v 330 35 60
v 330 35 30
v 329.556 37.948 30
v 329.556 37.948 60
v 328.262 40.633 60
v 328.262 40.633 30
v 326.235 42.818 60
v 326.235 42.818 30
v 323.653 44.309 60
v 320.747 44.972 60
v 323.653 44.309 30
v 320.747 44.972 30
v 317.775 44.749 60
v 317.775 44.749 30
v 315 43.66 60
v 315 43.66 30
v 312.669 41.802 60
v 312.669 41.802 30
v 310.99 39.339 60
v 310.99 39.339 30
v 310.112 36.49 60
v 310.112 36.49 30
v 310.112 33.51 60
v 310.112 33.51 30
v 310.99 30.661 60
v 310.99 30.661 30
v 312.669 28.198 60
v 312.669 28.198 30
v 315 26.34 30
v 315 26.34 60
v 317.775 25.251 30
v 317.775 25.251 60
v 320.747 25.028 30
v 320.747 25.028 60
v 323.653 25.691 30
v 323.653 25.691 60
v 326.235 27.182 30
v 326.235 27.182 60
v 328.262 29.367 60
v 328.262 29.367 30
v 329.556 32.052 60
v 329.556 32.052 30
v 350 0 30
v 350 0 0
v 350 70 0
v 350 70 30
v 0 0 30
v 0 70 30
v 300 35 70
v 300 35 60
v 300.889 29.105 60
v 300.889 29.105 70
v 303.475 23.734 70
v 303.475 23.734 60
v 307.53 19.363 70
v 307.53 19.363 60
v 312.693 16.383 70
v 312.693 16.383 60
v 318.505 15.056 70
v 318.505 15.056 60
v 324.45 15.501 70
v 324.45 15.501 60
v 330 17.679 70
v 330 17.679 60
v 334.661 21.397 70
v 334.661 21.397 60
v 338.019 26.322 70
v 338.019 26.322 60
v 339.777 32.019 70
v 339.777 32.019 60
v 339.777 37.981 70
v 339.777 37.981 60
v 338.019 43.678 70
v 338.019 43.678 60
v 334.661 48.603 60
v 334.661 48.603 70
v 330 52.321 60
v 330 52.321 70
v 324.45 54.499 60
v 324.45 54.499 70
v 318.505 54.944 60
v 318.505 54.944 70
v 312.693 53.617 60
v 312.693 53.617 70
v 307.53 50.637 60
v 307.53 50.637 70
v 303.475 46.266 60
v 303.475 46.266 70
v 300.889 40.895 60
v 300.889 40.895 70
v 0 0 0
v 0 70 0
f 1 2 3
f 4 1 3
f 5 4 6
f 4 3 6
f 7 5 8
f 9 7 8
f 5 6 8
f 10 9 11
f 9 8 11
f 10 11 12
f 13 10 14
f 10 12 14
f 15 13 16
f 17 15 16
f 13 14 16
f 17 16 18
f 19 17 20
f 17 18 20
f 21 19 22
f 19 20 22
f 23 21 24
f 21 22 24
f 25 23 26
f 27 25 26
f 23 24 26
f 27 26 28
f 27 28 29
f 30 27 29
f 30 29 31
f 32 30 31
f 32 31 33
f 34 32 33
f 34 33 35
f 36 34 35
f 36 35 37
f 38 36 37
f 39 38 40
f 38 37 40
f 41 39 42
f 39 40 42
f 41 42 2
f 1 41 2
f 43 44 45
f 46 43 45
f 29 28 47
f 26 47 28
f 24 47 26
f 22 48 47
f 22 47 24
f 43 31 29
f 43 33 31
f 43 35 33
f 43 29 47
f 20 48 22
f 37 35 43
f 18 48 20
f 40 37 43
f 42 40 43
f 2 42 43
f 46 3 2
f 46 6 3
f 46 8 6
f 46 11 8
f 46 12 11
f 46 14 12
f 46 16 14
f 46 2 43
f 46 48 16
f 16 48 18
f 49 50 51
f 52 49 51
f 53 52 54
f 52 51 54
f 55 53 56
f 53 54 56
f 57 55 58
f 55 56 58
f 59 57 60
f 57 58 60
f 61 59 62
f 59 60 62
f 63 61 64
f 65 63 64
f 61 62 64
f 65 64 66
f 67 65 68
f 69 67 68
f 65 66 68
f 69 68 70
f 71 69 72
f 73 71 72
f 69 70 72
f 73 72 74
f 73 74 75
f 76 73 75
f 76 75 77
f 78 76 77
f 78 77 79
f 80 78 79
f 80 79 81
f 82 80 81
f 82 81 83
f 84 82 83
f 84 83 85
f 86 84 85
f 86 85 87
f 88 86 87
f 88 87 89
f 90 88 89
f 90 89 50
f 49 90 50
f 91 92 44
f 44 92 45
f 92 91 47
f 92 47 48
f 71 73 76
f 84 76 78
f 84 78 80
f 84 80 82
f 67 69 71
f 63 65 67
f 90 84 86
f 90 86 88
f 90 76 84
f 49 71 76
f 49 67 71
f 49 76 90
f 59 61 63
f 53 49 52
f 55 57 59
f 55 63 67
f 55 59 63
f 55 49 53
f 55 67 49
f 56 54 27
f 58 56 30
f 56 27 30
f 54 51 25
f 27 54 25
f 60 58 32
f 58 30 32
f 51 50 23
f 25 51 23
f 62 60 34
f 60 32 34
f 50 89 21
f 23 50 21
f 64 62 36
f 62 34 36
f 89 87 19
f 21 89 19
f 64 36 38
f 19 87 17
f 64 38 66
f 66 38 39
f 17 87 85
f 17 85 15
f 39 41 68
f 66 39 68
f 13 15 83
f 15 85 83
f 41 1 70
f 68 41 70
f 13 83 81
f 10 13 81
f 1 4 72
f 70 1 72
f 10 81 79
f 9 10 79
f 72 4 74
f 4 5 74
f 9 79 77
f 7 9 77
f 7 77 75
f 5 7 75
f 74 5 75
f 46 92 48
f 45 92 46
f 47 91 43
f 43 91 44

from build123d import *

# Parameters (mm, degrees)
CROQUIS1_W              = 350
CROQUIS1_H              = 70
SALIENTE_EXTRUIR1_DEPTH = 30
CROQUIS2_R              = 20
SALIENTE_EXTRUIR2_DEPTH = 40
CROQUIS4_R              = 20
CROQUIS4_R_2            = 10
CORTAR_EXTRUIR1_DEPTH   = 30


with BuildPart() as part:
    # Croquis1 → Saliente-Extruir1 (new body)
    with BuildSketch(Plane.XY):
        with Locations((175, 35)):
            Rectangle(CROQUIS1_W, CROQUIS1_H)
    extrude(amount=SALIENTE_EXTRUIR1_DEPTH)

    # Croquis2 → Saliente-Extruir2 (add)
    with BuildSketch(Plane.XY.offset(30)):
        with Locations(Location((320, 35, 0), (0, 0, 180))):
            Circle(CROQUIS2_R)
    extrude(amount=SALIENTE_EXTRUIR2_DEPTH)

    # Croquis4 → Cortar-Extruir1 (cut)
    with BuildSketch(Plane.XY.offset(30)):
        with Locations((320, 35)):
            Circle(CROQUIS4_R)
        with Locations((320, 35)):
            Circle(CROQUIS4_R_2, mode=Mode.SUBTRACT)
    extrude(amount=CORTAR_EXTRUIR1_DEPTH, mode=Mode.SUBTRACT)


solid = part.part
